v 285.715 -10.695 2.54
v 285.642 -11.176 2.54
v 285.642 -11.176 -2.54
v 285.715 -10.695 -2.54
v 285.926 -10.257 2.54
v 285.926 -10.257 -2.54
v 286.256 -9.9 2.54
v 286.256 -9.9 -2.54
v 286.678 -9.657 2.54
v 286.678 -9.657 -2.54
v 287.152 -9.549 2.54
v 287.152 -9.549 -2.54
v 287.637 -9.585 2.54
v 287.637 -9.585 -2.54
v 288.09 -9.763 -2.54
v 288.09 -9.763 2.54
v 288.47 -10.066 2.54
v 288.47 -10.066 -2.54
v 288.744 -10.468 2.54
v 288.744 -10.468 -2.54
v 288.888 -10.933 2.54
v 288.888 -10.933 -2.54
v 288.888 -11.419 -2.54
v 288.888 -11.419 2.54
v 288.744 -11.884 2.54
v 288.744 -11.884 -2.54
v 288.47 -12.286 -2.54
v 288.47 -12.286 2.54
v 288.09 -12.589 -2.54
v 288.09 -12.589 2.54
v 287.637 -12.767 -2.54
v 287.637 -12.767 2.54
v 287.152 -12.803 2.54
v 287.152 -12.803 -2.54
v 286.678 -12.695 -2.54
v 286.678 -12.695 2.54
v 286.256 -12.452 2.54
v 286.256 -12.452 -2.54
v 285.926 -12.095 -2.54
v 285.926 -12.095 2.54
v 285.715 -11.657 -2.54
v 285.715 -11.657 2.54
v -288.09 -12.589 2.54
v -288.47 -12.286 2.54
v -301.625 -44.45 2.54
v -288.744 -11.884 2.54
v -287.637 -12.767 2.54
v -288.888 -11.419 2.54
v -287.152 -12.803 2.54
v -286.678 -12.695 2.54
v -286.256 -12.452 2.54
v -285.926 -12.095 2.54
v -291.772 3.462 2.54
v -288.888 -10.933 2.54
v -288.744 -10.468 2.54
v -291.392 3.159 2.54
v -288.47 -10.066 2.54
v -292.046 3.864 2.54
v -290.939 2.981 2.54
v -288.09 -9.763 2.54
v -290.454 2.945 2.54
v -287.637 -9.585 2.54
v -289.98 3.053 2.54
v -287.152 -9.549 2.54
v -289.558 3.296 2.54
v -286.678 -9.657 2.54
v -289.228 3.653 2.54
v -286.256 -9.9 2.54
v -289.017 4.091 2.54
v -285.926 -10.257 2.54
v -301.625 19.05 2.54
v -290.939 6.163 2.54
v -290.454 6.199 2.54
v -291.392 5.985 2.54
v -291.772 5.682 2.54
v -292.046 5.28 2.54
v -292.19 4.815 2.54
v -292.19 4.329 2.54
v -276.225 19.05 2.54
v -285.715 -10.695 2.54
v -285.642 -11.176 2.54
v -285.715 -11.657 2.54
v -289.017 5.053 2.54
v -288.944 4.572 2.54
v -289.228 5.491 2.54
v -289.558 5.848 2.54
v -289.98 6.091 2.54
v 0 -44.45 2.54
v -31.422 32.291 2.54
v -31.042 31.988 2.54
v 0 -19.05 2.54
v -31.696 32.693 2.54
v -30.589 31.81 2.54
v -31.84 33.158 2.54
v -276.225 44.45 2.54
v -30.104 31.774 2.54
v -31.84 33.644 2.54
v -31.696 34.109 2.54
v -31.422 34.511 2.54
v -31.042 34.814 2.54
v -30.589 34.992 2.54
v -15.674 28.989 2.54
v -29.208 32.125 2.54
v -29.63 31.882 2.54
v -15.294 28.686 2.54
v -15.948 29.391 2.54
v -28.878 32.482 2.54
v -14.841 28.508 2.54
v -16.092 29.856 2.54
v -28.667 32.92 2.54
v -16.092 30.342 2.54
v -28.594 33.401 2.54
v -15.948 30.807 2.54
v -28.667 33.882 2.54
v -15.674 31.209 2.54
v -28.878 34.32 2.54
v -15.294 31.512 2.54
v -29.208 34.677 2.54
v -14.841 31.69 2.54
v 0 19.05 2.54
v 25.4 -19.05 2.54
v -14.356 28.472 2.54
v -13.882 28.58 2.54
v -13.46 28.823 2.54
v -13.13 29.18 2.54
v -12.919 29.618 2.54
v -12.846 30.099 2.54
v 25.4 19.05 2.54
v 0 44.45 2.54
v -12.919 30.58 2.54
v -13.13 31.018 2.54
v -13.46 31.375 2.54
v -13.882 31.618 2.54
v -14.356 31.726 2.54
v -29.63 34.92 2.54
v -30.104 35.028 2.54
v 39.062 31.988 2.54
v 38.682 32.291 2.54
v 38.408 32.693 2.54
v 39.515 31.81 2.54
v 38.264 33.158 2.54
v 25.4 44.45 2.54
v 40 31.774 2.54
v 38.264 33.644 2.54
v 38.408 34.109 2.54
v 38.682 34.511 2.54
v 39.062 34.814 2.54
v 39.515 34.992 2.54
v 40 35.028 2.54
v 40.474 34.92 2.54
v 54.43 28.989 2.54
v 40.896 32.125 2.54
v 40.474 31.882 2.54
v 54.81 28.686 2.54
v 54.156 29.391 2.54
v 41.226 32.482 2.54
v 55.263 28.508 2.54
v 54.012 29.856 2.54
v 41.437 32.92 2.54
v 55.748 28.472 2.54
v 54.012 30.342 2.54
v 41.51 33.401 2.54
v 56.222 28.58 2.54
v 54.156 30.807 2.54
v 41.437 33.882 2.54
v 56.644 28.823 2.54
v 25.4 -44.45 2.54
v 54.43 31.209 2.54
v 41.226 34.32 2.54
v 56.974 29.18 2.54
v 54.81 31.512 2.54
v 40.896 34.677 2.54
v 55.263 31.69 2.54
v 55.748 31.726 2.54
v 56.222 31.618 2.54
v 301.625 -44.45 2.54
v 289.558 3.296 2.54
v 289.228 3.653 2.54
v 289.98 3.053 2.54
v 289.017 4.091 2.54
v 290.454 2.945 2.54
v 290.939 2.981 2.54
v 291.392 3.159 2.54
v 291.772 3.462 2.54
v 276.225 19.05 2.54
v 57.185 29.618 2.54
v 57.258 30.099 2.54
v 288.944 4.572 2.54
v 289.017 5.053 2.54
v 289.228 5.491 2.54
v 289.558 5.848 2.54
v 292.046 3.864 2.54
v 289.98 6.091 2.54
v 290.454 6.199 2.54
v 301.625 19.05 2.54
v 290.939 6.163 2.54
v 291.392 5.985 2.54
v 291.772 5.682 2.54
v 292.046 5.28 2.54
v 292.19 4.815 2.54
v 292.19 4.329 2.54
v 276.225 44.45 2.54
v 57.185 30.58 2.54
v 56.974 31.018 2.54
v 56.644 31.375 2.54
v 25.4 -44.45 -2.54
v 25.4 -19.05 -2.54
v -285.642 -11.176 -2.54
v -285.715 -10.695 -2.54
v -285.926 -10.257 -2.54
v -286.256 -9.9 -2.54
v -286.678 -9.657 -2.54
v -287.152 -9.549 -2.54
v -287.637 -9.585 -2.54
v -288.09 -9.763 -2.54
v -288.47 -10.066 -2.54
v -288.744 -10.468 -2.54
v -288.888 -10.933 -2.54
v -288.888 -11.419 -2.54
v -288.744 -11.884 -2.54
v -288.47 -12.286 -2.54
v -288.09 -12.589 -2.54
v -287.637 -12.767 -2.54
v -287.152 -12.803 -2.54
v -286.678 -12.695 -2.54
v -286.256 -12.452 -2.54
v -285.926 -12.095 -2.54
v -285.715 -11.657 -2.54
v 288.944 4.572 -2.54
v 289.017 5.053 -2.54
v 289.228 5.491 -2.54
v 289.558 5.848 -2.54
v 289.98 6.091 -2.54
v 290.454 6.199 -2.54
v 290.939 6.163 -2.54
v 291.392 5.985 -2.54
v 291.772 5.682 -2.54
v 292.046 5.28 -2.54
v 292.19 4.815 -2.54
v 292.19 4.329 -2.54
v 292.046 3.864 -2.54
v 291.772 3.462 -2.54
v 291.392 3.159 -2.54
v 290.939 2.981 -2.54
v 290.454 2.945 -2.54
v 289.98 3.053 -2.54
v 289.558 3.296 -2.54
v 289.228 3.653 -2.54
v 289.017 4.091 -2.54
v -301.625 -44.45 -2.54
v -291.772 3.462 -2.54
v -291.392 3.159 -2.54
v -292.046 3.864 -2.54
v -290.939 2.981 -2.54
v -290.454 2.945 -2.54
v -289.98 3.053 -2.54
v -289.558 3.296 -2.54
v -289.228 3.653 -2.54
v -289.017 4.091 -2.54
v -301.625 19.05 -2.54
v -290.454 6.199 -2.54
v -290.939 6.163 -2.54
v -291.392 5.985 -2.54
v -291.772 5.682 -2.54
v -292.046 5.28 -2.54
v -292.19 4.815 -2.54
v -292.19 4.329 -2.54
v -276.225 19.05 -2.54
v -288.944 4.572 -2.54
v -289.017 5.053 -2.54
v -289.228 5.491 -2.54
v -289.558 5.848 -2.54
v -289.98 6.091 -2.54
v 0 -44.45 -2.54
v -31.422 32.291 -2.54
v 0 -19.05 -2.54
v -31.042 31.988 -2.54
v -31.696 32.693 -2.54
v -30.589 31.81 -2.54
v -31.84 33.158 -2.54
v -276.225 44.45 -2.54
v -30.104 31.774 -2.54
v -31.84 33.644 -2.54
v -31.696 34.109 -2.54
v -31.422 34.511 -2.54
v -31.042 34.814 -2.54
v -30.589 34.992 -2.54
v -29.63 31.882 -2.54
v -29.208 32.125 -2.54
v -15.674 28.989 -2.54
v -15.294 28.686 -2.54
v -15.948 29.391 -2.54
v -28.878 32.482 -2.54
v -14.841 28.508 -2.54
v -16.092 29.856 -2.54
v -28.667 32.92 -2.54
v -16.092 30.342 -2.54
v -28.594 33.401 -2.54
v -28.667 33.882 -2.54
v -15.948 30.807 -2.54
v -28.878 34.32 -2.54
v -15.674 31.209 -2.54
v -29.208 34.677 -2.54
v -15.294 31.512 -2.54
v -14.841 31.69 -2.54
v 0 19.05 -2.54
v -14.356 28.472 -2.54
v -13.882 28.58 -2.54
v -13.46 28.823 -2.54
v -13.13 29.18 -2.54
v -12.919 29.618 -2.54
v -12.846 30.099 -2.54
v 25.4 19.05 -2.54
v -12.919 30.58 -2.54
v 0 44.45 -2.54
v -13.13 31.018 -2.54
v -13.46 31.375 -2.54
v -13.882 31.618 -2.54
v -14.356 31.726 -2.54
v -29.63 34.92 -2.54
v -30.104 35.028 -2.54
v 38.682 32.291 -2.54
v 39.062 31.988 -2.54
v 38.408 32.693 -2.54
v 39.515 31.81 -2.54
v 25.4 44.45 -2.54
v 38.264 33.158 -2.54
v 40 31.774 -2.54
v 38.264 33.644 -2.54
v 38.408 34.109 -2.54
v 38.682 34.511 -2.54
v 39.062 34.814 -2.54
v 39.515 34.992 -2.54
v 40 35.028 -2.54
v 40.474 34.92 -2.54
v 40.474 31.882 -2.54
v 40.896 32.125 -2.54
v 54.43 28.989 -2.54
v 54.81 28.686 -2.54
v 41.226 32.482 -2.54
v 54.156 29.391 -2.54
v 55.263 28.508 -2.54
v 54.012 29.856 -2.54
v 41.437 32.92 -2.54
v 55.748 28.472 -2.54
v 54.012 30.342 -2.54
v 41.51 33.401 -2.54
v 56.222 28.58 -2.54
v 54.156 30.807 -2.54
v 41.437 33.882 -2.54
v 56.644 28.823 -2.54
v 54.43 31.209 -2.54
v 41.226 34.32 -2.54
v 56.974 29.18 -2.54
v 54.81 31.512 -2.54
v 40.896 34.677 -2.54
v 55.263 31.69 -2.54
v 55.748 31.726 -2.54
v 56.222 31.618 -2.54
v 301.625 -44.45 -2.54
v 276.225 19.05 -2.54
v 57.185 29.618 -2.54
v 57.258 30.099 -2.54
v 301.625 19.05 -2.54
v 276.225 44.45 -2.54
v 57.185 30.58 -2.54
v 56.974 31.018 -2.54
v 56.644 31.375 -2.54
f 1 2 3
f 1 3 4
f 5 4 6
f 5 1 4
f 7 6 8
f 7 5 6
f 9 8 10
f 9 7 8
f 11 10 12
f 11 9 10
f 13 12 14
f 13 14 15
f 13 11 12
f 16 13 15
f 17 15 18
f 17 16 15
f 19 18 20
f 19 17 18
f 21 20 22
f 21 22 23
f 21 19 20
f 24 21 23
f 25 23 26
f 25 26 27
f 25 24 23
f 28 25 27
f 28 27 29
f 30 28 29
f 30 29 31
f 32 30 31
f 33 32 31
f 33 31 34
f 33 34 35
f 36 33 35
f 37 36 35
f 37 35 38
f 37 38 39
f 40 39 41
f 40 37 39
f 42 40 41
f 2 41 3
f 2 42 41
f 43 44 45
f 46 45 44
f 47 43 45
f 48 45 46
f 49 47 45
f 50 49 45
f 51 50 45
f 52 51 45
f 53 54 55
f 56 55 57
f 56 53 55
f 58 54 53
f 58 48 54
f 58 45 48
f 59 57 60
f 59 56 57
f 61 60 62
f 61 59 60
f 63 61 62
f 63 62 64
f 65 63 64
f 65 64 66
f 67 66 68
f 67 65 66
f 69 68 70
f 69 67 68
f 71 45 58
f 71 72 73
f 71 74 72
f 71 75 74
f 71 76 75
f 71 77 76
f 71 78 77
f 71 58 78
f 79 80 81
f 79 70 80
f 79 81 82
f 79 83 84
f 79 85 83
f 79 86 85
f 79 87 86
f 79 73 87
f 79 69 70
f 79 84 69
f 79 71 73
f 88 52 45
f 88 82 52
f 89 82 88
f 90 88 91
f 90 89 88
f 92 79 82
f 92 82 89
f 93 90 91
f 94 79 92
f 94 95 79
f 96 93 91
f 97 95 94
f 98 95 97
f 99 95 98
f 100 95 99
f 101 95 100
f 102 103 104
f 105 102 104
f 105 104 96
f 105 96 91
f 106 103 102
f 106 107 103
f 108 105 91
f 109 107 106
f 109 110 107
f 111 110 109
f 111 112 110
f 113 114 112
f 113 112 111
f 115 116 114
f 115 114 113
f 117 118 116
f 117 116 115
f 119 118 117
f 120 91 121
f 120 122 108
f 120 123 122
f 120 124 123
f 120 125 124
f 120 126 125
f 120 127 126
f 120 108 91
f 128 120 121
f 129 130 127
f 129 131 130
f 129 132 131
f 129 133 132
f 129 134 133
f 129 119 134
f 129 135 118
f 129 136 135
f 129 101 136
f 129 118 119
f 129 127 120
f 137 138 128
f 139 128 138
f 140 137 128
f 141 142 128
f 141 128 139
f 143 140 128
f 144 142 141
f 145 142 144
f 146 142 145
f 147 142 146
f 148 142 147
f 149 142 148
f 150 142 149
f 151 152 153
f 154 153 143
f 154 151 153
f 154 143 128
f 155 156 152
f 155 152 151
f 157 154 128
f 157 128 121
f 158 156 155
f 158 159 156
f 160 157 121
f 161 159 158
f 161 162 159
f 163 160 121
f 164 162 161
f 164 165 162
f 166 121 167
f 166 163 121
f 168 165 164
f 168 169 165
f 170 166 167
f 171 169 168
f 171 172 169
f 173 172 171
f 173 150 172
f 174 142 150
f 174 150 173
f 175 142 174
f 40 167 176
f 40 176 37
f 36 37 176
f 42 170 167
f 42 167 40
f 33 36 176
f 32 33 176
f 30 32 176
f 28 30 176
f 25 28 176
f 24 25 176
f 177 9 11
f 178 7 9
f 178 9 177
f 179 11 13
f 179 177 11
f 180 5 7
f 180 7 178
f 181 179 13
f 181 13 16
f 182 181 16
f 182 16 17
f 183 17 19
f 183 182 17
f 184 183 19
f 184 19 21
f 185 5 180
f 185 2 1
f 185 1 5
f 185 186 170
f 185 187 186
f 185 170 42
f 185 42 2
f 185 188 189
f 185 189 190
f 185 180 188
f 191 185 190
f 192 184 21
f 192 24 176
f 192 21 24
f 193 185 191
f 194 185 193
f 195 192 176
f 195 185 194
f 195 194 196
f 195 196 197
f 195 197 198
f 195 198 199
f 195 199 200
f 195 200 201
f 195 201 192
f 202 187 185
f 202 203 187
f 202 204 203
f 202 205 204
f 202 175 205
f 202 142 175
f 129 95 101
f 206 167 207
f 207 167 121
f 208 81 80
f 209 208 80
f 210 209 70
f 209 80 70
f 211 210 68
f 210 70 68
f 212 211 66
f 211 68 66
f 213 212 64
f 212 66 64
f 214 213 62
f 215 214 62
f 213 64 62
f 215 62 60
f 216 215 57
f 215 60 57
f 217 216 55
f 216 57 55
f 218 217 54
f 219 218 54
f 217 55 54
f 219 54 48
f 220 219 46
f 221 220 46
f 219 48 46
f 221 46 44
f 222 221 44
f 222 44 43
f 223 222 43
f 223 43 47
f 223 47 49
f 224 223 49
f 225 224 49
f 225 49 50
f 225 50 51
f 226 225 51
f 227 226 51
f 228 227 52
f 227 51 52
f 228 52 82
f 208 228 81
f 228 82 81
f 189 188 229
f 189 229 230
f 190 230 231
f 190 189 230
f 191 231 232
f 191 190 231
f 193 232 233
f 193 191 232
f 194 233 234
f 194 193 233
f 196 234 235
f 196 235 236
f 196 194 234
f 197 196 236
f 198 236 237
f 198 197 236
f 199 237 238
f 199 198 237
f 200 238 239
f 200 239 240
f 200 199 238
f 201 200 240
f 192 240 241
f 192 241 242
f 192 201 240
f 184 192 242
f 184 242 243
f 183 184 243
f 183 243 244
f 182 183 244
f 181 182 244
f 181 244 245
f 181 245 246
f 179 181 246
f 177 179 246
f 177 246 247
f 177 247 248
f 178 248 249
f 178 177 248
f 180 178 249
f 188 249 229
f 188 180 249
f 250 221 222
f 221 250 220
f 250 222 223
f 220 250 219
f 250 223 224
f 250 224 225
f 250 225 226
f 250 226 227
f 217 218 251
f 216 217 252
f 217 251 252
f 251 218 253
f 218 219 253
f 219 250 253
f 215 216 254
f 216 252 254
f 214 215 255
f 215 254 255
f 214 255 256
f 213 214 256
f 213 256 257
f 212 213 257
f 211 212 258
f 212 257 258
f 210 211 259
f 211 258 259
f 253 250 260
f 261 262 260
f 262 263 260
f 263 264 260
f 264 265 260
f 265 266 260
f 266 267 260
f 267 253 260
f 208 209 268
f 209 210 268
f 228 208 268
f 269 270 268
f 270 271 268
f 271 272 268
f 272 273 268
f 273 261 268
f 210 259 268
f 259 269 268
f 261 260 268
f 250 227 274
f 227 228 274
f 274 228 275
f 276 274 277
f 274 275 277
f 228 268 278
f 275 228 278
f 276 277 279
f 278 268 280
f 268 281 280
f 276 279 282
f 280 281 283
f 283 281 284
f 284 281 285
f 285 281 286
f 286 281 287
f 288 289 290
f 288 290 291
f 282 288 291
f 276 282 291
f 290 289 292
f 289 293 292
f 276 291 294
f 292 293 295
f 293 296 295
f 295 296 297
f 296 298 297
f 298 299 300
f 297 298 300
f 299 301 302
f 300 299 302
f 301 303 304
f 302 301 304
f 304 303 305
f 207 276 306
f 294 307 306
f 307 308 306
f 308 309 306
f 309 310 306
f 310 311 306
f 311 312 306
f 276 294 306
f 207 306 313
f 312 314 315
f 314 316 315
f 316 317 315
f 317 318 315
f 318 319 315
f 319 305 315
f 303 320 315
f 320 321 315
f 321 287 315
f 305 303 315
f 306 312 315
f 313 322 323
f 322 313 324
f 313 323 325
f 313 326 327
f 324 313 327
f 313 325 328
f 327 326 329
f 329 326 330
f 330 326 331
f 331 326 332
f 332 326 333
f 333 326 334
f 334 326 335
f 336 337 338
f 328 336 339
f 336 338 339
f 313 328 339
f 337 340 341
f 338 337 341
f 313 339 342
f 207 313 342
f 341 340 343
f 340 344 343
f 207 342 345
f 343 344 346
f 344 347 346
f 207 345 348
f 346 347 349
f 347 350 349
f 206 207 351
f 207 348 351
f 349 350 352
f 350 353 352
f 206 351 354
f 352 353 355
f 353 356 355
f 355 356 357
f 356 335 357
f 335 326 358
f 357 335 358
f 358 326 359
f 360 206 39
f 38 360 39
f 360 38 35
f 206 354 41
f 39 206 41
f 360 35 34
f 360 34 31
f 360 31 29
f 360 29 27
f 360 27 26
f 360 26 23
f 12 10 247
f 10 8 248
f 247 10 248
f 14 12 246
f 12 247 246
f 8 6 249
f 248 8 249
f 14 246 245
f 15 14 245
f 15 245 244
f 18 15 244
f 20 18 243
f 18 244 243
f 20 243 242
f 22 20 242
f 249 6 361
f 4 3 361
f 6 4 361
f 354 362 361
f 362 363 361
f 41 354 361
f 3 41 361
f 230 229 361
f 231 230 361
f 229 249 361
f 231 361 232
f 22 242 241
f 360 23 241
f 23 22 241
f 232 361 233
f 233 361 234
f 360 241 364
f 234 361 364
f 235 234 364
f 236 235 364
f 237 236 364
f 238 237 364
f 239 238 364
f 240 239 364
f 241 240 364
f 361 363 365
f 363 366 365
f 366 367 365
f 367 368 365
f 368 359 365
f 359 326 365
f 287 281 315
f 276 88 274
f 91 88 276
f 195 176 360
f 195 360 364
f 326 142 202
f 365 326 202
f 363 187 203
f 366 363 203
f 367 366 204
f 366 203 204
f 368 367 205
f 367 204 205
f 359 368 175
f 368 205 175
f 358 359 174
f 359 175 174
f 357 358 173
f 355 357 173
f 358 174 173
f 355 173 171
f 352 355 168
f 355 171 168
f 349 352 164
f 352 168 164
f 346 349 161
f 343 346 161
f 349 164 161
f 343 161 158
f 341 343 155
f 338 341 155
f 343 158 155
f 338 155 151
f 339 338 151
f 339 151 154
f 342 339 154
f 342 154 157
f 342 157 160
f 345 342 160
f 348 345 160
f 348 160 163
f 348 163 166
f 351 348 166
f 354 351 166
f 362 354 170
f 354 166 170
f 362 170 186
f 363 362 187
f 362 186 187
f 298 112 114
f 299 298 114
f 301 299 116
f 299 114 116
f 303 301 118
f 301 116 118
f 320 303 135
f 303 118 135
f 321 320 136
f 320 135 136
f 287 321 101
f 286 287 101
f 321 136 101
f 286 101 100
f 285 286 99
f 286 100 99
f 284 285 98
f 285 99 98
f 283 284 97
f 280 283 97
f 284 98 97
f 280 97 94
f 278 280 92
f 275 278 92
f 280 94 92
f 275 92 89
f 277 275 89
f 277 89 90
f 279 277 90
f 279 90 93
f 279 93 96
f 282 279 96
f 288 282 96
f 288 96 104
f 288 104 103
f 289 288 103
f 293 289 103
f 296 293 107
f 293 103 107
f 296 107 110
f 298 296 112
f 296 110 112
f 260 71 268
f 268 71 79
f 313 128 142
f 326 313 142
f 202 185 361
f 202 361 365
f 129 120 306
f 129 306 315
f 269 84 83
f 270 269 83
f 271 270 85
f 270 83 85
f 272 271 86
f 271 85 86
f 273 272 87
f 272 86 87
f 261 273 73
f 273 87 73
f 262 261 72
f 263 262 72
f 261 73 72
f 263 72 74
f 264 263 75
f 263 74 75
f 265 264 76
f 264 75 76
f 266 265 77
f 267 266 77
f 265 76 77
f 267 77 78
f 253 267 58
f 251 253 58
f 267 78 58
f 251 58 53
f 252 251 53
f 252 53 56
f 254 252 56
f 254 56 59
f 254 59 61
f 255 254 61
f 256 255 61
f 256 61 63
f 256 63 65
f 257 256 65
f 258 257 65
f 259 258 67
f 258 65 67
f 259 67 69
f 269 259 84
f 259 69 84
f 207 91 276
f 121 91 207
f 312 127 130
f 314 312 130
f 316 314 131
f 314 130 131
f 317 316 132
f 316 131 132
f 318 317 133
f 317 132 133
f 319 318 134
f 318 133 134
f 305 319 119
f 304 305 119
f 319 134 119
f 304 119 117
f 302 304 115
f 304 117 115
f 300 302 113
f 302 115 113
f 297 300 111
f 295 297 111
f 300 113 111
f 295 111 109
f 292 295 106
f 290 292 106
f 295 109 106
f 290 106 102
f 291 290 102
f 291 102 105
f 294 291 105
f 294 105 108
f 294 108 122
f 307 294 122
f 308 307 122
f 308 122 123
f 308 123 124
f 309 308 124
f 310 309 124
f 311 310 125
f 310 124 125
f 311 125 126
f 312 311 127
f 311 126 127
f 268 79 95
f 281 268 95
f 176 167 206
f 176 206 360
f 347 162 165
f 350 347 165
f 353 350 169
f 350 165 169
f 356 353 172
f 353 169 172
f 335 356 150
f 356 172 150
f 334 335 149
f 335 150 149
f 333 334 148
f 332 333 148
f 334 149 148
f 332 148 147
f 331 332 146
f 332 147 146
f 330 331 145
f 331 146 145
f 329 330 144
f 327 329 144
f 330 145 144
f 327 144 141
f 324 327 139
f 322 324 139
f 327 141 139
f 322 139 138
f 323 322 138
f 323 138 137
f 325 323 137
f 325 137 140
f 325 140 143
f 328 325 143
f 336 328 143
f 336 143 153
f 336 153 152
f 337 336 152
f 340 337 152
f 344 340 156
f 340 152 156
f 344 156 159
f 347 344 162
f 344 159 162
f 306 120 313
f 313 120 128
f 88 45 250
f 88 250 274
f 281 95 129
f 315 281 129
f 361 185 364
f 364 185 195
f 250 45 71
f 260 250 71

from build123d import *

# Parameters (mm, degrees)
SKETCH1_W           = 603.25
SKETCH1_H           = 88.9
BOSS_EXTRUDE1_DEPTH = 2.54
SKETCH2_W           = 25.4
SKETCH2_H           = 25.4
CUT_EXTRUDE1_DEPTH  = 5.08
SKETCH3_R           = 1.63195
CUT_EXTRUDE2_DEPTH  = 5.08
SKETCH4_R           = 1.63195
CUT_EXTRUDE3_DEPTH  = 5.08
LPATTERN1_COUNT     = 2
LPATTERN1_PITCH     = 70.104


with BuildPart() as part:
    # Sketch1 → Boss-Extrude1 (new body, symmetric)
    with BuildSketch(Plane.XY):
        Rectangle(SKETCH1_W, SKETCH1_H)
    extrude(amount=BOSS_EXTRUDE1_DEPTH, both=True)

    # Sketch2 → Cut-Extrude1 (cut)
    with BuildSketch(Plane.XY.offset(2.54)):
        with Locations((-288.925, 31.75)):
            Rectangle(SKETCH2_W, SKETCH2_H)
        with Locations((288.925, 31.75)):
            Rectangle(SKETCH2_W, SKETCH2_H)
        with Locations((12.7, 31.75)):
            Rectangle(SKETCH2_W, SKETCH2_H)
        with Locations((12.7, -31.75)):
            Rectangle(SKETCH2_W, SKETCH2_H)
    extrude(amount=-CUT_EXTRUDE1_DEPTH, mode=Mode.SUBTRACT)

    # Sketch3 → Cut-Extrude2 (cut)
    with BuildSketch(Plane.XY.offset(2.54)):
        with Locations((-14.478, 30.099)):
            Circle(SKETCH3_R)
        with Locations((-30.226, 33.401)):
            Circle(SKETCH3_R)
    cut_extrude2 = extrude(amount=-CUT_EXTRUDE2_DEPTH, mode=Mode.SUBTRACT)

    # Sketch4 → Cut-Extrude3 (cut)
    with BuildSketch(Plane.XY.offset(2.54)):
        with Locations((-290.576, 4.572)):
            Circle(SKETCH4_R)
        with Locations((-287.274, -11.176)):
            Circle(SKETCH4_R)
    cut_extrude3 = extrude(amount=-CUT_EXTRUDE3_DEPTH, mode=Mode.SUBTRACT)

    # Mirror2: Cut-Extrude3 across plane
    add(cut_extrude3.mirror(Plane(origin=(0, 0, 0), x_dir=(0, 0, 1), z_dir=(1, 0, 0))), mode=Mode.SUBTRACT)

    # LPattern1: Cut-Extrude2 ×2
    with Locations(*[(i * LPATTERN1_PITCH, 0, 0) for i in range(1, LPATTERN1_COUNT)]):
        add(cut_extrude2, mode=Mode.SUBTRACT)


solid = part.part
